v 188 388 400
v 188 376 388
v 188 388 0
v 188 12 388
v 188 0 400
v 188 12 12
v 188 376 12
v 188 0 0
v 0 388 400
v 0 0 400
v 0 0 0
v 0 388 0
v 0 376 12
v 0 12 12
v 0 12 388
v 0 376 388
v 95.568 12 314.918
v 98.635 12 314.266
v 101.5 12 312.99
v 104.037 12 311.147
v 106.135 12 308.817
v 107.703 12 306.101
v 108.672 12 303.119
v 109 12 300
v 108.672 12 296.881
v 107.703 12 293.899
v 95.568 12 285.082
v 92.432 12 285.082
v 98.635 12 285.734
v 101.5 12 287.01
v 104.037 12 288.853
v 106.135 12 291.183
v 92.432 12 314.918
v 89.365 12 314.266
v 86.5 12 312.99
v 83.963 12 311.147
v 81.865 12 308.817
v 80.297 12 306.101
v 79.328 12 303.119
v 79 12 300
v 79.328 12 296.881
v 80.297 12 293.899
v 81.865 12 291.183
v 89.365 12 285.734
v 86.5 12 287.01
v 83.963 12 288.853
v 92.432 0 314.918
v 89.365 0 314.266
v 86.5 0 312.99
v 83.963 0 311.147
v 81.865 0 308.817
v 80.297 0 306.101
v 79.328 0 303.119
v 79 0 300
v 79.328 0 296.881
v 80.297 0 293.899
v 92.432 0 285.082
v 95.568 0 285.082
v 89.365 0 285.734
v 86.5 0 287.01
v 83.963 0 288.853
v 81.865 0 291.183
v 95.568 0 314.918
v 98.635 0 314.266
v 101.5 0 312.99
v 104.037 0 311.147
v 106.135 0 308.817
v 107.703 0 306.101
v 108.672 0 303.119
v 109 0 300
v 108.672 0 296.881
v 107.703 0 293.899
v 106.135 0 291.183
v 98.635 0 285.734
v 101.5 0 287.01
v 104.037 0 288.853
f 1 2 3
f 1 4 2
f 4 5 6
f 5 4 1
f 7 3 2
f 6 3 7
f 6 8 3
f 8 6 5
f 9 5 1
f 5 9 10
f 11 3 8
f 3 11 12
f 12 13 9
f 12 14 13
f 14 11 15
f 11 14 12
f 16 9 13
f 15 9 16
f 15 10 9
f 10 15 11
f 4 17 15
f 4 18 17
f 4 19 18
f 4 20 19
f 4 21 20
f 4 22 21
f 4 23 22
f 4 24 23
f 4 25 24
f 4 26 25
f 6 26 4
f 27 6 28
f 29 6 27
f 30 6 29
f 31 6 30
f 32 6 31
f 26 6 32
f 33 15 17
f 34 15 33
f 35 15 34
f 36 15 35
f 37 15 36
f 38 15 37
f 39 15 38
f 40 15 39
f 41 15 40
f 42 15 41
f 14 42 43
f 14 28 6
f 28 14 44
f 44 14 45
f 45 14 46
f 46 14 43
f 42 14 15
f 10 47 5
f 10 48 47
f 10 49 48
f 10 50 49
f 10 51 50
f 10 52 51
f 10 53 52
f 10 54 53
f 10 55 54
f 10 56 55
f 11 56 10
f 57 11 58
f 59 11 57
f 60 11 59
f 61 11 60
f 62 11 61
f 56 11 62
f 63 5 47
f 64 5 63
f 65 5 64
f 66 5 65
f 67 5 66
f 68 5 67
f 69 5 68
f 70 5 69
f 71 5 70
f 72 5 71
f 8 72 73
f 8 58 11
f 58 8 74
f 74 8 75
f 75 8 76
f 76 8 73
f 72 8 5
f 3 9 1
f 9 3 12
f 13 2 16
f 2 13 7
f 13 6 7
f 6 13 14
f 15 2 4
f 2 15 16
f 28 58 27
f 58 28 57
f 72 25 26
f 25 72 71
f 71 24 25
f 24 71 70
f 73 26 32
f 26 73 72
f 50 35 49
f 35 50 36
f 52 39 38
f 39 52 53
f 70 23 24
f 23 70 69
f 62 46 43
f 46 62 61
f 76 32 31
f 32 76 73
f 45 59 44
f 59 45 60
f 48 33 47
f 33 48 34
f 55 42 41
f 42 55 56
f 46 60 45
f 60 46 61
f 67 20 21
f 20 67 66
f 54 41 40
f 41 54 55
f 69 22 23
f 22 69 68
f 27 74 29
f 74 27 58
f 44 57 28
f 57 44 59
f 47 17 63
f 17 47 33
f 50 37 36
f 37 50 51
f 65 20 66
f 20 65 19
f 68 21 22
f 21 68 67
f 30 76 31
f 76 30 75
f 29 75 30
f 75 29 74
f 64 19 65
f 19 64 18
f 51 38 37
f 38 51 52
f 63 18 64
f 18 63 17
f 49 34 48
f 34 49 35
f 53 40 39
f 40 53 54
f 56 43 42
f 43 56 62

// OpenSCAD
/*
    Router-drawer
    
    By Anton Augustsson
*/

module routerDrawer (
    thicknessPlywood,
    height,
    width,
    depth,
    x,y,z
    ){
/*
    ---------- Local varibles ---------- 
*/

holeDiameter = 30;


/*
    ---------- Code ---------- 
*/
  
translate([
    x,
    y,
    z])
difference () {
union () {

// Front
translate([
    0,
    0,
    0])
cube([
    width,
    thicknessPlywood,
    height]);

// Back
translate([
    0,
    depth-thicknessPlywood,
    0])
cube([
    width,
    thicknessPlywood,
    height]);

// Bottom
translate([
    0,
    thicknessPlywood,
    0])
cube([
    width,
    depth-thicknessPlywood*2,
    thicknessPlywood]);

// Top
translate([
    0,
    thicknessPlywood,
    height-thicknessPlywood])
cube([
    width,
    depth-thicknessPlywood*2,
    thicknessPlywood]);
}
translate([
    width/2,
    -1,
    height/4*3])
rotate([-90,0,0])
cylinder(
    h = thicknessPlywood+2,
    r = holeDiameter/2
    );

}
}


/*
    ---------- Example ---------- 
*/

sideOverhangWidth = 100;
sideOverhangDepth = 50;

thicknessMdf = 19;
thicknessPlywood = 12; 

totalHeight = 900;
totalWidth = 900; // t-profile
totalDepth = 500;

foundationHeight = 
    totalHeight
    -thicknessMdf;
foundationWidth = 
    totalWidth
    -sideOverhangWidth*2;
foundationDepth =
    totalDepth
    -sideOverhangDepth*2;

routerBoxHeight = 400;
routerBoxWidth = 400;        
positionShelfHeight = 
        foundationHeight
        -thicknessPlywood*2
        -routerBoxHeight;

sideHeight = 
        foundationHeight
        -thicknessPlywood*2;


routerDrawer (
    thicknessPlywood,
    routerBoxHeight,
    (routerBoxWidth-thicknessPlywood*2)/2,
    foundationDepth-thicknessPlywood,
    0,0,0
    );
